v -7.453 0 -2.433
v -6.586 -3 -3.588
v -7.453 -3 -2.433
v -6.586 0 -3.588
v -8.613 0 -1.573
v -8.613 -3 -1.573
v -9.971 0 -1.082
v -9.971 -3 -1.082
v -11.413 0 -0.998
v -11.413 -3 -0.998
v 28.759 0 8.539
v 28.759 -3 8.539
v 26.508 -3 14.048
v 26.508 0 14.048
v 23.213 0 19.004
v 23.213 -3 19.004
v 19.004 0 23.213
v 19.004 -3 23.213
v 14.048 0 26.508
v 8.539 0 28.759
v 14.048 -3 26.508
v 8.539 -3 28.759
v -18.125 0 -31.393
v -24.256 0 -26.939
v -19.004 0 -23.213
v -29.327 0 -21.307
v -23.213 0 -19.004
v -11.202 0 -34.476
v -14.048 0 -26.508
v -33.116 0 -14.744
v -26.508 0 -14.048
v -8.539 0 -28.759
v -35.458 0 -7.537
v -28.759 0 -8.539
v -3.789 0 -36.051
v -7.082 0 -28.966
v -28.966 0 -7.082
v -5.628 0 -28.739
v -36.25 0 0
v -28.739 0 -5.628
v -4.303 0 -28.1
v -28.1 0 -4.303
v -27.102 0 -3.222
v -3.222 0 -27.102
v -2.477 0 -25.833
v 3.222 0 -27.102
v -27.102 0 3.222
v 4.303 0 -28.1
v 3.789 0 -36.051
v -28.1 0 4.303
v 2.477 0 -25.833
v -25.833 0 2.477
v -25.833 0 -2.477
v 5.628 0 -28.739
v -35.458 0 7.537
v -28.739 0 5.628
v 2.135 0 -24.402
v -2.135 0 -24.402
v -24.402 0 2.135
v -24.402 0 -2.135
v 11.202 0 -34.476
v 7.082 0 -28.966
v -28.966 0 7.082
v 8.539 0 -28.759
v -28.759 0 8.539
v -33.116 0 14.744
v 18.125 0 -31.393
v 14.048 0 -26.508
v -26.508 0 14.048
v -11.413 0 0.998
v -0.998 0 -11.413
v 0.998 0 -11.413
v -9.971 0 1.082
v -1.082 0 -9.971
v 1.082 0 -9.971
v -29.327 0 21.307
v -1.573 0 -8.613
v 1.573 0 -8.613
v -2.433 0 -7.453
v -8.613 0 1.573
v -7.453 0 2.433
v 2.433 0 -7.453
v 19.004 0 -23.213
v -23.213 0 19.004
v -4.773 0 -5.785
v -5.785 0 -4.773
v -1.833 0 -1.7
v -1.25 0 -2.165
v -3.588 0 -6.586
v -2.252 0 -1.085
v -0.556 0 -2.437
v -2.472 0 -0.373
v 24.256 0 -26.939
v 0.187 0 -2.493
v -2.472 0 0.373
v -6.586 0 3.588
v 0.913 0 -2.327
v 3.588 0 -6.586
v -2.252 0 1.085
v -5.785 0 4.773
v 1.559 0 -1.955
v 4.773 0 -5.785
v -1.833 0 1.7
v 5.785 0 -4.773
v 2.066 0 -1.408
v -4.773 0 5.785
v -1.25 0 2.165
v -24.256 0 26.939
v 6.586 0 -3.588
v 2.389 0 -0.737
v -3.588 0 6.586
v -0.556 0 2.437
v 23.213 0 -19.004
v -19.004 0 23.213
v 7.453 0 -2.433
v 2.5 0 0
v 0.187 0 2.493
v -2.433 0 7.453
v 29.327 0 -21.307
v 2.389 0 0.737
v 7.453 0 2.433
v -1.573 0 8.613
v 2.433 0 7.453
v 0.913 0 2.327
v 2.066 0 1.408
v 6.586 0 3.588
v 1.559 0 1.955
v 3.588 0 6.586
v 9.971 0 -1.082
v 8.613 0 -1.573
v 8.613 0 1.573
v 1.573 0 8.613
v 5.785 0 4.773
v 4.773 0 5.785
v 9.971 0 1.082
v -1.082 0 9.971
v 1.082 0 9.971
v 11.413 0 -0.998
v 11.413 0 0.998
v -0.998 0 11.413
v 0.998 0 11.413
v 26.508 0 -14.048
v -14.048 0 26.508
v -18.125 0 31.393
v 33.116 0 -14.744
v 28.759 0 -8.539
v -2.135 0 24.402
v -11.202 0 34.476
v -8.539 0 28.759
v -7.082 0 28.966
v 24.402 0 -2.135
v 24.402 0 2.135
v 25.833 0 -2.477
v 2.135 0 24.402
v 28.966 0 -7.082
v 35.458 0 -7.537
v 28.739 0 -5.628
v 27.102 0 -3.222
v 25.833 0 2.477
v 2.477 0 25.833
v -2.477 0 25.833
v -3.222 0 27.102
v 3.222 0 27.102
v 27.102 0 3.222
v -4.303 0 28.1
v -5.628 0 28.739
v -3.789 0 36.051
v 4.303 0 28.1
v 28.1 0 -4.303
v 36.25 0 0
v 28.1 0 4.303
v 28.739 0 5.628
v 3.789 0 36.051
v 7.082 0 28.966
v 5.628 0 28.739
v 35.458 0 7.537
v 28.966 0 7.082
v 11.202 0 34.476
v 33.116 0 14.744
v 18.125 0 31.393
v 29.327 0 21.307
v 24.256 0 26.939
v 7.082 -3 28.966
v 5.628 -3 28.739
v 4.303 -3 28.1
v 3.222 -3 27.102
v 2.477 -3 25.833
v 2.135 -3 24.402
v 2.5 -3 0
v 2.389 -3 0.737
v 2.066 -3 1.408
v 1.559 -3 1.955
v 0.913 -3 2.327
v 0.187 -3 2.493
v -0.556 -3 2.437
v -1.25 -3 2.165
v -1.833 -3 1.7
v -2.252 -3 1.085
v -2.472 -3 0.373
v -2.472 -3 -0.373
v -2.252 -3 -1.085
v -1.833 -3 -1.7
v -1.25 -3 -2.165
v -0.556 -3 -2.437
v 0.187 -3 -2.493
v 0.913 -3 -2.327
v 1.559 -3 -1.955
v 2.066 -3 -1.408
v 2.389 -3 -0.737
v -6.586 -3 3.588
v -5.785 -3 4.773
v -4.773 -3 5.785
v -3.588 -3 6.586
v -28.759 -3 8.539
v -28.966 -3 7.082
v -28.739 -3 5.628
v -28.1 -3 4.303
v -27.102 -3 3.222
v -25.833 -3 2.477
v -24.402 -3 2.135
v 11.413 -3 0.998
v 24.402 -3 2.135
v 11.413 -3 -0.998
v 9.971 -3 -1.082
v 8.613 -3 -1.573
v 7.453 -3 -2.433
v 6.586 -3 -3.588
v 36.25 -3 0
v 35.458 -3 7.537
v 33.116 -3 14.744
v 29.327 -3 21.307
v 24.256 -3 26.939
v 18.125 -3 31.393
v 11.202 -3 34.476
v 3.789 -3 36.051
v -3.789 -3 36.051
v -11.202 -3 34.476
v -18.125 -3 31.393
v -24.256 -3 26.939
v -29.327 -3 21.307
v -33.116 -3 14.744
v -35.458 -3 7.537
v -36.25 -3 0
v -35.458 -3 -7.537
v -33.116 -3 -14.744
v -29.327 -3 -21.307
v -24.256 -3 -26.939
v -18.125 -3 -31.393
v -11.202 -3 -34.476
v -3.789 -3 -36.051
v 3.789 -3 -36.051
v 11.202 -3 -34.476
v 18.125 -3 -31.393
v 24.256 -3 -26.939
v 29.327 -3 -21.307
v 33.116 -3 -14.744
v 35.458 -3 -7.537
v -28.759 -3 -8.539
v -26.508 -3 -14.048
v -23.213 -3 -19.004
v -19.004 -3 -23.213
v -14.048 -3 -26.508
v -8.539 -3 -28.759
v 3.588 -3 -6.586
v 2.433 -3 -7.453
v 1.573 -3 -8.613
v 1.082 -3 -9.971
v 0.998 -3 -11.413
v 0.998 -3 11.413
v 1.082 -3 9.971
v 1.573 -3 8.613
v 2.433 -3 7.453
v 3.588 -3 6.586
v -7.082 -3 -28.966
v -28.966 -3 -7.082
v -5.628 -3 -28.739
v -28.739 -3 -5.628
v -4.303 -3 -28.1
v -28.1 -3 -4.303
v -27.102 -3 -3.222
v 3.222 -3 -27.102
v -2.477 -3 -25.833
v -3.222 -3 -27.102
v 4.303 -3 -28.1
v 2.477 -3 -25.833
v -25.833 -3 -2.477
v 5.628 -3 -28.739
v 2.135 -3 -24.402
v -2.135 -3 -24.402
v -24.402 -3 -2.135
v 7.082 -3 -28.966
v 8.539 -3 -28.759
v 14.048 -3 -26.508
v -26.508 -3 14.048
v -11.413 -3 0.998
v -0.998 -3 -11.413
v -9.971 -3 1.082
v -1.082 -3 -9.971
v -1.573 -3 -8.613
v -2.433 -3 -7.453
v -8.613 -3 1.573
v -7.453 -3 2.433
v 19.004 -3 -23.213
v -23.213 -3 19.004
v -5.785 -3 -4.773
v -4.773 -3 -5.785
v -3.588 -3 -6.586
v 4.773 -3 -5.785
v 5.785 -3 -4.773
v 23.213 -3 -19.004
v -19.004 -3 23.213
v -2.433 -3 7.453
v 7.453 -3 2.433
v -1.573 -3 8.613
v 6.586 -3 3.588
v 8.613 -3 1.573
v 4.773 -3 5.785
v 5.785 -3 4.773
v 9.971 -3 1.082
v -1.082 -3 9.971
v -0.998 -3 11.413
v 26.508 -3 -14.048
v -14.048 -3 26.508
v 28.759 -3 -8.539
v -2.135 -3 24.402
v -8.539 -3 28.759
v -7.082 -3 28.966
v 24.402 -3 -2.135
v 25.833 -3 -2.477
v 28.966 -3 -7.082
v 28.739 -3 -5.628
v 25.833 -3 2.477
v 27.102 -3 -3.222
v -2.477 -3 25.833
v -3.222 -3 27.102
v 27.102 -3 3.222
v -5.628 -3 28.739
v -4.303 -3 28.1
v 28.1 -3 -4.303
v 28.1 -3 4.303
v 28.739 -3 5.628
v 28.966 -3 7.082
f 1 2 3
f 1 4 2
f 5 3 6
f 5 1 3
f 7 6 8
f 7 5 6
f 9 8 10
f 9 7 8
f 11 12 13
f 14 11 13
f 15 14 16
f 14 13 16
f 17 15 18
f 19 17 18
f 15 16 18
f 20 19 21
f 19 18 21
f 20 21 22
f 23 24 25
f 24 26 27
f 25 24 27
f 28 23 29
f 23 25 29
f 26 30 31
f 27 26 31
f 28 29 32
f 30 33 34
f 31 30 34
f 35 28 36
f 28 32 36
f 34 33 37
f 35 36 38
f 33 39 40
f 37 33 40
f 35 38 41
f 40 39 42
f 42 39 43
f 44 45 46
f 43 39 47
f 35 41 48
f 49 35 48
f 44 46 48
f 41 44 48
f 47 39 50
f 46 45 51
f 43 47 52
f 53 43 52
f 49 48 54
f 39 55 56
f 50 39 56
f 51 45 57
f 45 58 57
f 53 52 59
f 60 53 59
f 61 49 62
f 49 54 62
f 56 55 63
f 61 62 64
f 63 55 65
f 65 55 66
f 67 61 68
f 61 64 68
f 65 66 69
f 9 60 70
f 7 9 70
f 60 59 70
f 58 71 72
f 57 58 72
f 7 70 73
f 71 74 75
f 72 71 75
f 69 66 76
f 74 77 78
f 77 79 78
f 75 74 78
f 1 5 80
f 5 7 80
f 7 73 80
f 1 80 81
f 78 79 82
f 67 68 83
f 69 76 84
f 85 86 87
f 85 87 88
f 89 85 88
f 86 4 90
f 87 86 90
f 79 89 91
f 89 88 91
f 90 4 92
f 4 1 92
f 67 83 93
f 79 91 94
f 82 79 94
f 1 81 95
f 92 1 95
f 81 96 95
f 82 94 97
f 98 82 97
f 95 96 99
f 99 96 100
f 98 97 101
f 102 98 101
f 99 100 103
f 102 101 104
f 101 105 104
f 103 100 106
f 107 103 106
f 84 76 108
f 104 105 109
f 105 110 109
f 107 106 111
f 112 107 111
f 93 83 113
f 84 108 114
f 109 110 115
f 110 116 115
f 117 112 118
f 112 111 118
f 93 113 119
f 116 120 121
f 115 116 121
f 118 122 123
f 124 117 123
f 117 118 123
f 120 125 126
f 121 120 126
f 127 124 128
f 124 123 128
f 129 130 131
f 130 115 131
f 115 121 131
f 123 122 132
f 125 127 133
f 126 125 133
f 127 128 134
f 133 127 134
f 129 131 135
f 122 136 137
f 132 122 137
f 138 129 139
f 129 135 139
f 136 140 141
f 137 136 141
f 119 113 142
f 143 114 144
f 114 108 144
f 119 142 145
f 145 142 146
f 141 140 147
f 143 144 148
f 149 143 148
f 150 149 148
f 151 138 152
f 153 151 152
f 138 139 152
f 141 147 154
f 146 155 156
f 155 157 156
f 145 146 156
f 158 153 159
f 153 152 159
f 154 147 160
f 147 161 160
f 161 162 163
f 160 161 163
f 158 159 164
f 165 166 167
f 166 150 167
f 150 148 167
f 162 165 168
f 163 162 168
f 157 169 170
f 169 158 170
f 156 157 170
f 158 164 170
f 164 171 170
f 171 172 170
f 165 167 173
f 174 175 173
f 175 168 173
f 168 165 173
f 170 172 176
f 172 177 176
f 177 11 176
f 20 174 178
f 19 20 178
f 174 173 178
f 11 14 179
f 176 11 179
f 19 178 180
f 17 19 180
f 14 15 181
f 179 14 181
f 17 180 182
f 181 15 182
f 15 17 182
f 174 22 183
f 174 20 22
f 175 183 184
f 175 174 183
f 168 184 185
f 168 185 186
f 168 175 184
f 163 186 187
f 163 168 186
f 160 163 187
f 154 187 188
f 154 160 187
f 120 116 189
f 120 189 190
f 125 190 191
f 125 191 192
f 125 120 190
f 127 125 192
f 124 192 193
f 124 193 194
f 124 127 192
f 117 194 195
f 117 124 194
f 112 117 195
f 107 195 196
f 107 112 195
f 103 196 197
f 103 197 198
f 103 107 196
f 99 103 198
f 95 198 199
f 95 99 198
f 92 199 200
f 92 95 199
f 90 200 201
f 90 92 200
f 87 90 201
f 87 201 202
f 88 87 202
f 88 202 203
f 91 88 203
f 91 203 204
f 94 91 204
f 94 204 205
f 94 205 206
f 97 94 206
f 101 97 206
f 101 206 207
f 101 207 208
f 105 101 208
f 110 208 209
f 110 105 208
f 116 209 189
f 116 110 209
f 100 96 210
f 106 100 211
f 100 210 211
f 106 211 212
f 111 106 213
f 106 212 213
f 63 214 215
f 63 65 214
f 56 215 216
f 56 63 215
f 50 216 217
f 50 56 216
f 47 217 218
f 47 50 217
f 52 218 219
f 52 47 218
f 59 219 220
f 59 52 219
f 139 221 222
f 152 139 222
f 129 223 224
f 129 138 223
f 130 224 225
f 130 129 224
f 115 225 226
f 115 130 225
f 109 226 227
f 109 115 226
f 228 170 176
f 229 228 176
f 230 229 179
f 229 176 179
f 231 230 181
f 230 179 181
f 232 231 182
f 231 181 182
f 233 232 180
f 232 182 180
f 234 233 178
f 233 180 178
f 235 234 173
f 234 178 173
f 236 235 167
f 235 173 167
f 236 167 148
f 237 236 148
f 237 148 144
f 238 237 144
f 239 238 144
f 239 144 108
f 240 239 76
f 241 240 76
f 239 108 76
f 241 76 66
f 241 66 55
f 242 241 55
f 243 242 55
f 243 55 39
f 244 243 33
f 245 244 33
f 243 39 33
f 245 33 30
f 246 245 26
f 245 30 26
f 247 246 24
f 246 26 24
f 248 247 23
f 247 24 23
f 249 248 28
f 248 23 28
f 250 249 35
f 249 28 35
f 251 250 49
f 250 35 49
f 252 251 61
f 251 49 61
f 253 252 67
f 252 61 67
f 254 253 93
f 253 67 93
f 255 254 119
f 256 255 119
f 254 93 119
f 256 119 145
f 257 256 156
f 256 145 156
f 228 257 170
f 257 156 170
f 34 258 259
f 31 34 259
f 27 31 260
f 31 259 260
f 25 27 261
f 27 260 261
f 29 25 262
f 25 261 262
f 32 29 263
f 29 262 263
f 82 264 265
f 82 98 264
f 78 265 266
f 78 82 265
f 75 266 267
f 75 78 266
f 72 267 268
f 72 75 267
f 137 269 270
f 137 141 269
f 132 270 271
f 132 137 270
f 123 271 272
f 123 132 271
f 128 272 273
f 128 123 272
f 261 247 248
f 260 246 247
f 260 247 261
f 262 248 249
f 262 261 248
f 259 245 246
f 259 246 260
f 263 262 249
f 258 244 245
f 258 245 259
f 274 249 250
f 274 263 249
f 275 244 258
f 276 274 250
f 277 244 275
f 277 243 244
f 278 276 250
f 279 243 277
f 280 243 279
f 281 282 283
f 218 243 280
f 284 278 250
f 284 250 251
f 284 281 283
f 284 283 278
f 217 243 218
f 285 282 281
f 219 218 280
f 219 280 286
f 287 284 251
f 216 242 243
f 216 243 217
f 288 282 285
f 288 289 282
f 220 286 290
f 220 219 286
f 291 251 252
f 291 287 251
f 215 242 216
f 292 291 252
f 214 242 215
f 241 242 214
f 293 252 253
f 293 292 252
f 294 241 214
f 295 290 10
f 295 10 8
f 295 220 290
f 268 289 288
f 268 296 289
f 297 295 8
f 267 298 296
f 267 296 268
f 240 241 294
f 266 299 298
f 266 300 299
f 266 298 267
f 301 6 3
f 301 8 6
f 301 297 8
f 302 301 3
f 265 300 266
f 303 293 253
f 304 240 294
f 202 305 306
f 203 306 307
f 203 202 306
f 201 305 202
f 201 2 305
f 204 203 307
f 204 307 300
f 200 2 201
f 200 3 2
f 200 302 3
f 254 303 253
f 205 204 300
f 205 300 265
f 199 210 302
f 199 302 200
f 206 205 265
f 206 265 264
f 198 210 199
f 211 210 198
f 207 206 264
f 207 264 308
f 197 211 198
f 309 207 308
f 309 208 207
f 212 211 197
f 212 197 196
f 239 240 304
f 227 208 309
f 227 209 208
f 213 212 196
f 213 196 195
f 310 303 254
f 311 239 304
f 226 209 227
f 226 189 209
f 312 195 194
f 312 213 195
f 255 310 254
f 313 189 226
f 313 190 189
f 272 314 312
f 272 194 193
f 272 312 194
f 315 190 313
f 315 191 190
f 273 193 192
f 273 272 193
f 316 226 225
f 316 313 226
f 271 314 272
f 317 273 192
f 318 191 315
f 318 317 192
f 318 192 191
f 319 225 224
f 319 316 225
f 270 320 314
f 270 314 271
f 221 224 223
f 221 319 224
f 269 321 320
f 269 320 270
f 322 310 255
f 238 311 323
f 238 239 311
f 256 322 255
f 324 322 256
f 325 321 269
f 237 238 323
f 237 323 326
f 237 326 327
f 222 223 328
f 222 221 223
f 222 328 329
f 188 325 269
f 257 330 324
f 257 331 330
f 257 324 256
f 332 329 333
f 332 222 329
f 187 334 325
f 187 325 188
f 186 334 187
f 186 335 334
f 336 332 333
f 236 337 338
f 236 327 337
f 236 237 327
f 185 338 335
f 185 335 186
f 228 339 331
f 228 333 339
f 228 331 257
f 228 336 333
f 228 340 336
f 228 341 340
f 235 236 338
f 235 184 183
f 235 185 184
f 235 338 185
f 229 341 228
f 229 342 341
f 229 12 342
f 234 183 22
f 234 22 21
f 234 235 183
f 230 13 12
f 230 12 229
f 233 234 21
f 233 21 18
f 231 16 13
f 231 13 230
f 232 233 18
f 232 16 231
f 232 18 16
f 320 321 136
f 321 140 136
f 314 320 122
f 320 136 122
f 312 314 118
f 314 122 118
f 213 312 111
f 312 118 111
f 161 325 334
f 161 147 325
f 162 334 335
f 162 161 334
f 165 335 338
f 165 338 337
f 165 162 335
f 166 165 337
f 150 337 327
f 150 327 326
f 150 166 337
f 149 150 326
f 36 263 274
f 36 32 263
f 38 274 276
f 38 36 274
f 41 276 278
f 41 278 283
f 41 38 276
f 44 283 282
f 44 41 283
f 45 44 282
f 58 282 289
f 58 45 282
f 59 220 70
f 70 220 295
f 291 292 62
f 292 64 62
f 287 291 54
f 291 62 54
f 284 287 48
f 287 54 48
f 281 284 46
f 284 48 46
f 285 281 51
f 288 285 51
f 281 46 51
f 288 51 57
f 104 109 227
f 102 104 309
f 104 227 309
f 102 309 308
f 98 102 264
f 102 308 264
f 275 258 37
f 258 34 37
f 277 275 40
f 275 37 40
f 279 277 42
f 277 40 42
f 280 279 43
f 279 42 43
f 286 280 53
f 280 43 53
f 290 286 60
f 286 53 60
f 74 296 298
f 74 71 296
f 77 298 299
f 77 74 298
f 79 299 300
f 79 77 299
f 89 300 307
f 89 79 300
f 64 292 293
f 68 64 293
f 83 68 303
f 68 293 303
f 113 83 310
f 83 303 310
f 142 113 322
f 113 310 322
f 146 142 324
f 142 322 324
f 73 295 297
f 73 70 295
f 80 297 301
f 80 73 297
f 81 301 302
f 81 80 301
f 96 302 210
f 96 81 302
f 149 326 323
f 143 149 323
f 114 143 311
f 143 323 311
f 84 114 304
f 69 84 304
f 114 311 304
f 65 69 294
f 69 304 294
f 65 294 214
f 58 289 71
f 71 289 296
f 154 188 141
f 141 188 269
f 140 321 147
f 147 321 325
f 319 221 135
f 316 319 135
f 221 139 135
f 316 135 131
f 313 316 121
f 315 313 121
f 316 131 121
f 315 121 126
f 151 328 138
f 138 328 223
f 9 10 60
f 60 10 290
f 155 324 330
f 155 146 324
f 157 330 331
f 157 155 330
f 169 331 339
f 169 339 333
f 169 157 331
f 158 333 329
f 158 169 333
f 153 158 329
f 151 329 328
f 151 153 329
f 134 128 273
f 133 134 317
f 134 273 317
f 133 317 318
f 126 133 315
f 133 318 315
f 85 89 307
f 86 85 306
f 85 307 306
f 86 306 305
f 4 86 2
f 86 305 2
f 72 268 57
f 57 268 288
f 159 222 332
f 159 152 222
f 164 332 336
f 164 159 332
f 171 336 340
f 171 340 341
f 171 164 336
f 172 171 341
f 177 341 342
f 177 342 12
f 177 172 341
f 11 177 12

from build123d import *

# Parameters (mm, degrees)
F0_R     = 36.25
F0_R_2   = 2.5
F1_DEPTH = 3
F3_DEPTH = 25
F4_R     = 5


with BuildPart() as f1:
    # F0 (on Front) → F1 (new body)
    with BuildSketch(Plane.XZ):
        Circle(F0_R)
        Circle(F0_R_2, mode=Mode.SUBTRACT)
    extrude(amount=F1_DEPTH)

    # F2 (on face) → F3 (cut)
    with BuildSketch(Plane.XZ.offset(3)):
        with BuildLine():
            ThreePointArc((-29.885841, -2.614672), (-21.213203, -21.213203), (-2.614672, -29.885841))
            Line((-2.614672, -29.885841), (-0.653668, -7.47146))
            ThreePointArc((-0.653668, -7.47146), (-5.303301, -5.303301), (-7.47146, -0.653668))
            Line((-7.47146, -0.653668), (-29.885841, -2.614672))
        make_face()
        with BuildLine():
            Line((-0.653668, 7.47146), (-2.614672, 29.885841))
            ThreePointArc((-2.614672, 29.885841), (-21.213203, 21.213203), (-29.885841, 2.614672))
            Line((-29.885841, 2.614672), (-7.47146, 0.653668))
            ThreePointArc((-7.47146, 0.653668), (-5.303301, 5.303301), (-0.653668, 7.47146))
        make_face()
        with BuildLine():
            Line((7.47146, 0.653668), (29.885841, 2.614672))
            ThreePointArc((29.885841, 2.614672), (21.213203, 21.213203), (2.614672, 29.885841))
            Line((2.614672, 29.885841), (0.653668, 7.47146))
            ThreePointArc((0.653668, 7.47146), (5.303301, 5.303301), (7.47146, 0.653668))
        make_face()
        with BuildLine():
            ThreePointArc((2.614672, -29.885841), (21.213203, -21.213203), (29.885841, -2.614672))
            Line((29.885841, -2.614672), (7.47146, -0.653668))
            ThreePointArc((7.47146, -0.653668), (5.303301, -5.303301), (0.653668, -7.47146))
            Line((0.653668, -7.47146), (2.614672, -29.885841))
        make_face()
    extrude(amount=-F3_DEPTH, mode=Mode.SUBTRACT)

    # F4
    f4_edges = [f1.edges().sort_by_distance(p)[0] for p in [
        (-0.653668, -1.5, 7.47146),
        (-7.47146, -1.5, 0.653668),
        (7.47146, -1.5, -0.653668),
        (0.653668, -1.5, -7.47146),
        (-7.47146, -1.5, -0.653668),
        (-0.653668, -1.5, -7.47146),
        (0.653668, -1.5, 7.47146),
        (7.47146, -1.5, 0.653668),
        (2.614672, -1.5, 29.885841),
        (-29.885841, -1.5, -2.614672),
        (29.885841, -1.5, -2.614672),
        (-2.614672, -1.5, -29.885841),
        (29.885841, -1.5, 2.614672),
        (-29.885841, -1.5, 2.614672),
        (2.614672, -1.5, -29.885841),
        (-2.614672, -1.5, 29.885841),
    ]]
    fillet(f4_edges, radius=F4_R)


solid = f1.part
